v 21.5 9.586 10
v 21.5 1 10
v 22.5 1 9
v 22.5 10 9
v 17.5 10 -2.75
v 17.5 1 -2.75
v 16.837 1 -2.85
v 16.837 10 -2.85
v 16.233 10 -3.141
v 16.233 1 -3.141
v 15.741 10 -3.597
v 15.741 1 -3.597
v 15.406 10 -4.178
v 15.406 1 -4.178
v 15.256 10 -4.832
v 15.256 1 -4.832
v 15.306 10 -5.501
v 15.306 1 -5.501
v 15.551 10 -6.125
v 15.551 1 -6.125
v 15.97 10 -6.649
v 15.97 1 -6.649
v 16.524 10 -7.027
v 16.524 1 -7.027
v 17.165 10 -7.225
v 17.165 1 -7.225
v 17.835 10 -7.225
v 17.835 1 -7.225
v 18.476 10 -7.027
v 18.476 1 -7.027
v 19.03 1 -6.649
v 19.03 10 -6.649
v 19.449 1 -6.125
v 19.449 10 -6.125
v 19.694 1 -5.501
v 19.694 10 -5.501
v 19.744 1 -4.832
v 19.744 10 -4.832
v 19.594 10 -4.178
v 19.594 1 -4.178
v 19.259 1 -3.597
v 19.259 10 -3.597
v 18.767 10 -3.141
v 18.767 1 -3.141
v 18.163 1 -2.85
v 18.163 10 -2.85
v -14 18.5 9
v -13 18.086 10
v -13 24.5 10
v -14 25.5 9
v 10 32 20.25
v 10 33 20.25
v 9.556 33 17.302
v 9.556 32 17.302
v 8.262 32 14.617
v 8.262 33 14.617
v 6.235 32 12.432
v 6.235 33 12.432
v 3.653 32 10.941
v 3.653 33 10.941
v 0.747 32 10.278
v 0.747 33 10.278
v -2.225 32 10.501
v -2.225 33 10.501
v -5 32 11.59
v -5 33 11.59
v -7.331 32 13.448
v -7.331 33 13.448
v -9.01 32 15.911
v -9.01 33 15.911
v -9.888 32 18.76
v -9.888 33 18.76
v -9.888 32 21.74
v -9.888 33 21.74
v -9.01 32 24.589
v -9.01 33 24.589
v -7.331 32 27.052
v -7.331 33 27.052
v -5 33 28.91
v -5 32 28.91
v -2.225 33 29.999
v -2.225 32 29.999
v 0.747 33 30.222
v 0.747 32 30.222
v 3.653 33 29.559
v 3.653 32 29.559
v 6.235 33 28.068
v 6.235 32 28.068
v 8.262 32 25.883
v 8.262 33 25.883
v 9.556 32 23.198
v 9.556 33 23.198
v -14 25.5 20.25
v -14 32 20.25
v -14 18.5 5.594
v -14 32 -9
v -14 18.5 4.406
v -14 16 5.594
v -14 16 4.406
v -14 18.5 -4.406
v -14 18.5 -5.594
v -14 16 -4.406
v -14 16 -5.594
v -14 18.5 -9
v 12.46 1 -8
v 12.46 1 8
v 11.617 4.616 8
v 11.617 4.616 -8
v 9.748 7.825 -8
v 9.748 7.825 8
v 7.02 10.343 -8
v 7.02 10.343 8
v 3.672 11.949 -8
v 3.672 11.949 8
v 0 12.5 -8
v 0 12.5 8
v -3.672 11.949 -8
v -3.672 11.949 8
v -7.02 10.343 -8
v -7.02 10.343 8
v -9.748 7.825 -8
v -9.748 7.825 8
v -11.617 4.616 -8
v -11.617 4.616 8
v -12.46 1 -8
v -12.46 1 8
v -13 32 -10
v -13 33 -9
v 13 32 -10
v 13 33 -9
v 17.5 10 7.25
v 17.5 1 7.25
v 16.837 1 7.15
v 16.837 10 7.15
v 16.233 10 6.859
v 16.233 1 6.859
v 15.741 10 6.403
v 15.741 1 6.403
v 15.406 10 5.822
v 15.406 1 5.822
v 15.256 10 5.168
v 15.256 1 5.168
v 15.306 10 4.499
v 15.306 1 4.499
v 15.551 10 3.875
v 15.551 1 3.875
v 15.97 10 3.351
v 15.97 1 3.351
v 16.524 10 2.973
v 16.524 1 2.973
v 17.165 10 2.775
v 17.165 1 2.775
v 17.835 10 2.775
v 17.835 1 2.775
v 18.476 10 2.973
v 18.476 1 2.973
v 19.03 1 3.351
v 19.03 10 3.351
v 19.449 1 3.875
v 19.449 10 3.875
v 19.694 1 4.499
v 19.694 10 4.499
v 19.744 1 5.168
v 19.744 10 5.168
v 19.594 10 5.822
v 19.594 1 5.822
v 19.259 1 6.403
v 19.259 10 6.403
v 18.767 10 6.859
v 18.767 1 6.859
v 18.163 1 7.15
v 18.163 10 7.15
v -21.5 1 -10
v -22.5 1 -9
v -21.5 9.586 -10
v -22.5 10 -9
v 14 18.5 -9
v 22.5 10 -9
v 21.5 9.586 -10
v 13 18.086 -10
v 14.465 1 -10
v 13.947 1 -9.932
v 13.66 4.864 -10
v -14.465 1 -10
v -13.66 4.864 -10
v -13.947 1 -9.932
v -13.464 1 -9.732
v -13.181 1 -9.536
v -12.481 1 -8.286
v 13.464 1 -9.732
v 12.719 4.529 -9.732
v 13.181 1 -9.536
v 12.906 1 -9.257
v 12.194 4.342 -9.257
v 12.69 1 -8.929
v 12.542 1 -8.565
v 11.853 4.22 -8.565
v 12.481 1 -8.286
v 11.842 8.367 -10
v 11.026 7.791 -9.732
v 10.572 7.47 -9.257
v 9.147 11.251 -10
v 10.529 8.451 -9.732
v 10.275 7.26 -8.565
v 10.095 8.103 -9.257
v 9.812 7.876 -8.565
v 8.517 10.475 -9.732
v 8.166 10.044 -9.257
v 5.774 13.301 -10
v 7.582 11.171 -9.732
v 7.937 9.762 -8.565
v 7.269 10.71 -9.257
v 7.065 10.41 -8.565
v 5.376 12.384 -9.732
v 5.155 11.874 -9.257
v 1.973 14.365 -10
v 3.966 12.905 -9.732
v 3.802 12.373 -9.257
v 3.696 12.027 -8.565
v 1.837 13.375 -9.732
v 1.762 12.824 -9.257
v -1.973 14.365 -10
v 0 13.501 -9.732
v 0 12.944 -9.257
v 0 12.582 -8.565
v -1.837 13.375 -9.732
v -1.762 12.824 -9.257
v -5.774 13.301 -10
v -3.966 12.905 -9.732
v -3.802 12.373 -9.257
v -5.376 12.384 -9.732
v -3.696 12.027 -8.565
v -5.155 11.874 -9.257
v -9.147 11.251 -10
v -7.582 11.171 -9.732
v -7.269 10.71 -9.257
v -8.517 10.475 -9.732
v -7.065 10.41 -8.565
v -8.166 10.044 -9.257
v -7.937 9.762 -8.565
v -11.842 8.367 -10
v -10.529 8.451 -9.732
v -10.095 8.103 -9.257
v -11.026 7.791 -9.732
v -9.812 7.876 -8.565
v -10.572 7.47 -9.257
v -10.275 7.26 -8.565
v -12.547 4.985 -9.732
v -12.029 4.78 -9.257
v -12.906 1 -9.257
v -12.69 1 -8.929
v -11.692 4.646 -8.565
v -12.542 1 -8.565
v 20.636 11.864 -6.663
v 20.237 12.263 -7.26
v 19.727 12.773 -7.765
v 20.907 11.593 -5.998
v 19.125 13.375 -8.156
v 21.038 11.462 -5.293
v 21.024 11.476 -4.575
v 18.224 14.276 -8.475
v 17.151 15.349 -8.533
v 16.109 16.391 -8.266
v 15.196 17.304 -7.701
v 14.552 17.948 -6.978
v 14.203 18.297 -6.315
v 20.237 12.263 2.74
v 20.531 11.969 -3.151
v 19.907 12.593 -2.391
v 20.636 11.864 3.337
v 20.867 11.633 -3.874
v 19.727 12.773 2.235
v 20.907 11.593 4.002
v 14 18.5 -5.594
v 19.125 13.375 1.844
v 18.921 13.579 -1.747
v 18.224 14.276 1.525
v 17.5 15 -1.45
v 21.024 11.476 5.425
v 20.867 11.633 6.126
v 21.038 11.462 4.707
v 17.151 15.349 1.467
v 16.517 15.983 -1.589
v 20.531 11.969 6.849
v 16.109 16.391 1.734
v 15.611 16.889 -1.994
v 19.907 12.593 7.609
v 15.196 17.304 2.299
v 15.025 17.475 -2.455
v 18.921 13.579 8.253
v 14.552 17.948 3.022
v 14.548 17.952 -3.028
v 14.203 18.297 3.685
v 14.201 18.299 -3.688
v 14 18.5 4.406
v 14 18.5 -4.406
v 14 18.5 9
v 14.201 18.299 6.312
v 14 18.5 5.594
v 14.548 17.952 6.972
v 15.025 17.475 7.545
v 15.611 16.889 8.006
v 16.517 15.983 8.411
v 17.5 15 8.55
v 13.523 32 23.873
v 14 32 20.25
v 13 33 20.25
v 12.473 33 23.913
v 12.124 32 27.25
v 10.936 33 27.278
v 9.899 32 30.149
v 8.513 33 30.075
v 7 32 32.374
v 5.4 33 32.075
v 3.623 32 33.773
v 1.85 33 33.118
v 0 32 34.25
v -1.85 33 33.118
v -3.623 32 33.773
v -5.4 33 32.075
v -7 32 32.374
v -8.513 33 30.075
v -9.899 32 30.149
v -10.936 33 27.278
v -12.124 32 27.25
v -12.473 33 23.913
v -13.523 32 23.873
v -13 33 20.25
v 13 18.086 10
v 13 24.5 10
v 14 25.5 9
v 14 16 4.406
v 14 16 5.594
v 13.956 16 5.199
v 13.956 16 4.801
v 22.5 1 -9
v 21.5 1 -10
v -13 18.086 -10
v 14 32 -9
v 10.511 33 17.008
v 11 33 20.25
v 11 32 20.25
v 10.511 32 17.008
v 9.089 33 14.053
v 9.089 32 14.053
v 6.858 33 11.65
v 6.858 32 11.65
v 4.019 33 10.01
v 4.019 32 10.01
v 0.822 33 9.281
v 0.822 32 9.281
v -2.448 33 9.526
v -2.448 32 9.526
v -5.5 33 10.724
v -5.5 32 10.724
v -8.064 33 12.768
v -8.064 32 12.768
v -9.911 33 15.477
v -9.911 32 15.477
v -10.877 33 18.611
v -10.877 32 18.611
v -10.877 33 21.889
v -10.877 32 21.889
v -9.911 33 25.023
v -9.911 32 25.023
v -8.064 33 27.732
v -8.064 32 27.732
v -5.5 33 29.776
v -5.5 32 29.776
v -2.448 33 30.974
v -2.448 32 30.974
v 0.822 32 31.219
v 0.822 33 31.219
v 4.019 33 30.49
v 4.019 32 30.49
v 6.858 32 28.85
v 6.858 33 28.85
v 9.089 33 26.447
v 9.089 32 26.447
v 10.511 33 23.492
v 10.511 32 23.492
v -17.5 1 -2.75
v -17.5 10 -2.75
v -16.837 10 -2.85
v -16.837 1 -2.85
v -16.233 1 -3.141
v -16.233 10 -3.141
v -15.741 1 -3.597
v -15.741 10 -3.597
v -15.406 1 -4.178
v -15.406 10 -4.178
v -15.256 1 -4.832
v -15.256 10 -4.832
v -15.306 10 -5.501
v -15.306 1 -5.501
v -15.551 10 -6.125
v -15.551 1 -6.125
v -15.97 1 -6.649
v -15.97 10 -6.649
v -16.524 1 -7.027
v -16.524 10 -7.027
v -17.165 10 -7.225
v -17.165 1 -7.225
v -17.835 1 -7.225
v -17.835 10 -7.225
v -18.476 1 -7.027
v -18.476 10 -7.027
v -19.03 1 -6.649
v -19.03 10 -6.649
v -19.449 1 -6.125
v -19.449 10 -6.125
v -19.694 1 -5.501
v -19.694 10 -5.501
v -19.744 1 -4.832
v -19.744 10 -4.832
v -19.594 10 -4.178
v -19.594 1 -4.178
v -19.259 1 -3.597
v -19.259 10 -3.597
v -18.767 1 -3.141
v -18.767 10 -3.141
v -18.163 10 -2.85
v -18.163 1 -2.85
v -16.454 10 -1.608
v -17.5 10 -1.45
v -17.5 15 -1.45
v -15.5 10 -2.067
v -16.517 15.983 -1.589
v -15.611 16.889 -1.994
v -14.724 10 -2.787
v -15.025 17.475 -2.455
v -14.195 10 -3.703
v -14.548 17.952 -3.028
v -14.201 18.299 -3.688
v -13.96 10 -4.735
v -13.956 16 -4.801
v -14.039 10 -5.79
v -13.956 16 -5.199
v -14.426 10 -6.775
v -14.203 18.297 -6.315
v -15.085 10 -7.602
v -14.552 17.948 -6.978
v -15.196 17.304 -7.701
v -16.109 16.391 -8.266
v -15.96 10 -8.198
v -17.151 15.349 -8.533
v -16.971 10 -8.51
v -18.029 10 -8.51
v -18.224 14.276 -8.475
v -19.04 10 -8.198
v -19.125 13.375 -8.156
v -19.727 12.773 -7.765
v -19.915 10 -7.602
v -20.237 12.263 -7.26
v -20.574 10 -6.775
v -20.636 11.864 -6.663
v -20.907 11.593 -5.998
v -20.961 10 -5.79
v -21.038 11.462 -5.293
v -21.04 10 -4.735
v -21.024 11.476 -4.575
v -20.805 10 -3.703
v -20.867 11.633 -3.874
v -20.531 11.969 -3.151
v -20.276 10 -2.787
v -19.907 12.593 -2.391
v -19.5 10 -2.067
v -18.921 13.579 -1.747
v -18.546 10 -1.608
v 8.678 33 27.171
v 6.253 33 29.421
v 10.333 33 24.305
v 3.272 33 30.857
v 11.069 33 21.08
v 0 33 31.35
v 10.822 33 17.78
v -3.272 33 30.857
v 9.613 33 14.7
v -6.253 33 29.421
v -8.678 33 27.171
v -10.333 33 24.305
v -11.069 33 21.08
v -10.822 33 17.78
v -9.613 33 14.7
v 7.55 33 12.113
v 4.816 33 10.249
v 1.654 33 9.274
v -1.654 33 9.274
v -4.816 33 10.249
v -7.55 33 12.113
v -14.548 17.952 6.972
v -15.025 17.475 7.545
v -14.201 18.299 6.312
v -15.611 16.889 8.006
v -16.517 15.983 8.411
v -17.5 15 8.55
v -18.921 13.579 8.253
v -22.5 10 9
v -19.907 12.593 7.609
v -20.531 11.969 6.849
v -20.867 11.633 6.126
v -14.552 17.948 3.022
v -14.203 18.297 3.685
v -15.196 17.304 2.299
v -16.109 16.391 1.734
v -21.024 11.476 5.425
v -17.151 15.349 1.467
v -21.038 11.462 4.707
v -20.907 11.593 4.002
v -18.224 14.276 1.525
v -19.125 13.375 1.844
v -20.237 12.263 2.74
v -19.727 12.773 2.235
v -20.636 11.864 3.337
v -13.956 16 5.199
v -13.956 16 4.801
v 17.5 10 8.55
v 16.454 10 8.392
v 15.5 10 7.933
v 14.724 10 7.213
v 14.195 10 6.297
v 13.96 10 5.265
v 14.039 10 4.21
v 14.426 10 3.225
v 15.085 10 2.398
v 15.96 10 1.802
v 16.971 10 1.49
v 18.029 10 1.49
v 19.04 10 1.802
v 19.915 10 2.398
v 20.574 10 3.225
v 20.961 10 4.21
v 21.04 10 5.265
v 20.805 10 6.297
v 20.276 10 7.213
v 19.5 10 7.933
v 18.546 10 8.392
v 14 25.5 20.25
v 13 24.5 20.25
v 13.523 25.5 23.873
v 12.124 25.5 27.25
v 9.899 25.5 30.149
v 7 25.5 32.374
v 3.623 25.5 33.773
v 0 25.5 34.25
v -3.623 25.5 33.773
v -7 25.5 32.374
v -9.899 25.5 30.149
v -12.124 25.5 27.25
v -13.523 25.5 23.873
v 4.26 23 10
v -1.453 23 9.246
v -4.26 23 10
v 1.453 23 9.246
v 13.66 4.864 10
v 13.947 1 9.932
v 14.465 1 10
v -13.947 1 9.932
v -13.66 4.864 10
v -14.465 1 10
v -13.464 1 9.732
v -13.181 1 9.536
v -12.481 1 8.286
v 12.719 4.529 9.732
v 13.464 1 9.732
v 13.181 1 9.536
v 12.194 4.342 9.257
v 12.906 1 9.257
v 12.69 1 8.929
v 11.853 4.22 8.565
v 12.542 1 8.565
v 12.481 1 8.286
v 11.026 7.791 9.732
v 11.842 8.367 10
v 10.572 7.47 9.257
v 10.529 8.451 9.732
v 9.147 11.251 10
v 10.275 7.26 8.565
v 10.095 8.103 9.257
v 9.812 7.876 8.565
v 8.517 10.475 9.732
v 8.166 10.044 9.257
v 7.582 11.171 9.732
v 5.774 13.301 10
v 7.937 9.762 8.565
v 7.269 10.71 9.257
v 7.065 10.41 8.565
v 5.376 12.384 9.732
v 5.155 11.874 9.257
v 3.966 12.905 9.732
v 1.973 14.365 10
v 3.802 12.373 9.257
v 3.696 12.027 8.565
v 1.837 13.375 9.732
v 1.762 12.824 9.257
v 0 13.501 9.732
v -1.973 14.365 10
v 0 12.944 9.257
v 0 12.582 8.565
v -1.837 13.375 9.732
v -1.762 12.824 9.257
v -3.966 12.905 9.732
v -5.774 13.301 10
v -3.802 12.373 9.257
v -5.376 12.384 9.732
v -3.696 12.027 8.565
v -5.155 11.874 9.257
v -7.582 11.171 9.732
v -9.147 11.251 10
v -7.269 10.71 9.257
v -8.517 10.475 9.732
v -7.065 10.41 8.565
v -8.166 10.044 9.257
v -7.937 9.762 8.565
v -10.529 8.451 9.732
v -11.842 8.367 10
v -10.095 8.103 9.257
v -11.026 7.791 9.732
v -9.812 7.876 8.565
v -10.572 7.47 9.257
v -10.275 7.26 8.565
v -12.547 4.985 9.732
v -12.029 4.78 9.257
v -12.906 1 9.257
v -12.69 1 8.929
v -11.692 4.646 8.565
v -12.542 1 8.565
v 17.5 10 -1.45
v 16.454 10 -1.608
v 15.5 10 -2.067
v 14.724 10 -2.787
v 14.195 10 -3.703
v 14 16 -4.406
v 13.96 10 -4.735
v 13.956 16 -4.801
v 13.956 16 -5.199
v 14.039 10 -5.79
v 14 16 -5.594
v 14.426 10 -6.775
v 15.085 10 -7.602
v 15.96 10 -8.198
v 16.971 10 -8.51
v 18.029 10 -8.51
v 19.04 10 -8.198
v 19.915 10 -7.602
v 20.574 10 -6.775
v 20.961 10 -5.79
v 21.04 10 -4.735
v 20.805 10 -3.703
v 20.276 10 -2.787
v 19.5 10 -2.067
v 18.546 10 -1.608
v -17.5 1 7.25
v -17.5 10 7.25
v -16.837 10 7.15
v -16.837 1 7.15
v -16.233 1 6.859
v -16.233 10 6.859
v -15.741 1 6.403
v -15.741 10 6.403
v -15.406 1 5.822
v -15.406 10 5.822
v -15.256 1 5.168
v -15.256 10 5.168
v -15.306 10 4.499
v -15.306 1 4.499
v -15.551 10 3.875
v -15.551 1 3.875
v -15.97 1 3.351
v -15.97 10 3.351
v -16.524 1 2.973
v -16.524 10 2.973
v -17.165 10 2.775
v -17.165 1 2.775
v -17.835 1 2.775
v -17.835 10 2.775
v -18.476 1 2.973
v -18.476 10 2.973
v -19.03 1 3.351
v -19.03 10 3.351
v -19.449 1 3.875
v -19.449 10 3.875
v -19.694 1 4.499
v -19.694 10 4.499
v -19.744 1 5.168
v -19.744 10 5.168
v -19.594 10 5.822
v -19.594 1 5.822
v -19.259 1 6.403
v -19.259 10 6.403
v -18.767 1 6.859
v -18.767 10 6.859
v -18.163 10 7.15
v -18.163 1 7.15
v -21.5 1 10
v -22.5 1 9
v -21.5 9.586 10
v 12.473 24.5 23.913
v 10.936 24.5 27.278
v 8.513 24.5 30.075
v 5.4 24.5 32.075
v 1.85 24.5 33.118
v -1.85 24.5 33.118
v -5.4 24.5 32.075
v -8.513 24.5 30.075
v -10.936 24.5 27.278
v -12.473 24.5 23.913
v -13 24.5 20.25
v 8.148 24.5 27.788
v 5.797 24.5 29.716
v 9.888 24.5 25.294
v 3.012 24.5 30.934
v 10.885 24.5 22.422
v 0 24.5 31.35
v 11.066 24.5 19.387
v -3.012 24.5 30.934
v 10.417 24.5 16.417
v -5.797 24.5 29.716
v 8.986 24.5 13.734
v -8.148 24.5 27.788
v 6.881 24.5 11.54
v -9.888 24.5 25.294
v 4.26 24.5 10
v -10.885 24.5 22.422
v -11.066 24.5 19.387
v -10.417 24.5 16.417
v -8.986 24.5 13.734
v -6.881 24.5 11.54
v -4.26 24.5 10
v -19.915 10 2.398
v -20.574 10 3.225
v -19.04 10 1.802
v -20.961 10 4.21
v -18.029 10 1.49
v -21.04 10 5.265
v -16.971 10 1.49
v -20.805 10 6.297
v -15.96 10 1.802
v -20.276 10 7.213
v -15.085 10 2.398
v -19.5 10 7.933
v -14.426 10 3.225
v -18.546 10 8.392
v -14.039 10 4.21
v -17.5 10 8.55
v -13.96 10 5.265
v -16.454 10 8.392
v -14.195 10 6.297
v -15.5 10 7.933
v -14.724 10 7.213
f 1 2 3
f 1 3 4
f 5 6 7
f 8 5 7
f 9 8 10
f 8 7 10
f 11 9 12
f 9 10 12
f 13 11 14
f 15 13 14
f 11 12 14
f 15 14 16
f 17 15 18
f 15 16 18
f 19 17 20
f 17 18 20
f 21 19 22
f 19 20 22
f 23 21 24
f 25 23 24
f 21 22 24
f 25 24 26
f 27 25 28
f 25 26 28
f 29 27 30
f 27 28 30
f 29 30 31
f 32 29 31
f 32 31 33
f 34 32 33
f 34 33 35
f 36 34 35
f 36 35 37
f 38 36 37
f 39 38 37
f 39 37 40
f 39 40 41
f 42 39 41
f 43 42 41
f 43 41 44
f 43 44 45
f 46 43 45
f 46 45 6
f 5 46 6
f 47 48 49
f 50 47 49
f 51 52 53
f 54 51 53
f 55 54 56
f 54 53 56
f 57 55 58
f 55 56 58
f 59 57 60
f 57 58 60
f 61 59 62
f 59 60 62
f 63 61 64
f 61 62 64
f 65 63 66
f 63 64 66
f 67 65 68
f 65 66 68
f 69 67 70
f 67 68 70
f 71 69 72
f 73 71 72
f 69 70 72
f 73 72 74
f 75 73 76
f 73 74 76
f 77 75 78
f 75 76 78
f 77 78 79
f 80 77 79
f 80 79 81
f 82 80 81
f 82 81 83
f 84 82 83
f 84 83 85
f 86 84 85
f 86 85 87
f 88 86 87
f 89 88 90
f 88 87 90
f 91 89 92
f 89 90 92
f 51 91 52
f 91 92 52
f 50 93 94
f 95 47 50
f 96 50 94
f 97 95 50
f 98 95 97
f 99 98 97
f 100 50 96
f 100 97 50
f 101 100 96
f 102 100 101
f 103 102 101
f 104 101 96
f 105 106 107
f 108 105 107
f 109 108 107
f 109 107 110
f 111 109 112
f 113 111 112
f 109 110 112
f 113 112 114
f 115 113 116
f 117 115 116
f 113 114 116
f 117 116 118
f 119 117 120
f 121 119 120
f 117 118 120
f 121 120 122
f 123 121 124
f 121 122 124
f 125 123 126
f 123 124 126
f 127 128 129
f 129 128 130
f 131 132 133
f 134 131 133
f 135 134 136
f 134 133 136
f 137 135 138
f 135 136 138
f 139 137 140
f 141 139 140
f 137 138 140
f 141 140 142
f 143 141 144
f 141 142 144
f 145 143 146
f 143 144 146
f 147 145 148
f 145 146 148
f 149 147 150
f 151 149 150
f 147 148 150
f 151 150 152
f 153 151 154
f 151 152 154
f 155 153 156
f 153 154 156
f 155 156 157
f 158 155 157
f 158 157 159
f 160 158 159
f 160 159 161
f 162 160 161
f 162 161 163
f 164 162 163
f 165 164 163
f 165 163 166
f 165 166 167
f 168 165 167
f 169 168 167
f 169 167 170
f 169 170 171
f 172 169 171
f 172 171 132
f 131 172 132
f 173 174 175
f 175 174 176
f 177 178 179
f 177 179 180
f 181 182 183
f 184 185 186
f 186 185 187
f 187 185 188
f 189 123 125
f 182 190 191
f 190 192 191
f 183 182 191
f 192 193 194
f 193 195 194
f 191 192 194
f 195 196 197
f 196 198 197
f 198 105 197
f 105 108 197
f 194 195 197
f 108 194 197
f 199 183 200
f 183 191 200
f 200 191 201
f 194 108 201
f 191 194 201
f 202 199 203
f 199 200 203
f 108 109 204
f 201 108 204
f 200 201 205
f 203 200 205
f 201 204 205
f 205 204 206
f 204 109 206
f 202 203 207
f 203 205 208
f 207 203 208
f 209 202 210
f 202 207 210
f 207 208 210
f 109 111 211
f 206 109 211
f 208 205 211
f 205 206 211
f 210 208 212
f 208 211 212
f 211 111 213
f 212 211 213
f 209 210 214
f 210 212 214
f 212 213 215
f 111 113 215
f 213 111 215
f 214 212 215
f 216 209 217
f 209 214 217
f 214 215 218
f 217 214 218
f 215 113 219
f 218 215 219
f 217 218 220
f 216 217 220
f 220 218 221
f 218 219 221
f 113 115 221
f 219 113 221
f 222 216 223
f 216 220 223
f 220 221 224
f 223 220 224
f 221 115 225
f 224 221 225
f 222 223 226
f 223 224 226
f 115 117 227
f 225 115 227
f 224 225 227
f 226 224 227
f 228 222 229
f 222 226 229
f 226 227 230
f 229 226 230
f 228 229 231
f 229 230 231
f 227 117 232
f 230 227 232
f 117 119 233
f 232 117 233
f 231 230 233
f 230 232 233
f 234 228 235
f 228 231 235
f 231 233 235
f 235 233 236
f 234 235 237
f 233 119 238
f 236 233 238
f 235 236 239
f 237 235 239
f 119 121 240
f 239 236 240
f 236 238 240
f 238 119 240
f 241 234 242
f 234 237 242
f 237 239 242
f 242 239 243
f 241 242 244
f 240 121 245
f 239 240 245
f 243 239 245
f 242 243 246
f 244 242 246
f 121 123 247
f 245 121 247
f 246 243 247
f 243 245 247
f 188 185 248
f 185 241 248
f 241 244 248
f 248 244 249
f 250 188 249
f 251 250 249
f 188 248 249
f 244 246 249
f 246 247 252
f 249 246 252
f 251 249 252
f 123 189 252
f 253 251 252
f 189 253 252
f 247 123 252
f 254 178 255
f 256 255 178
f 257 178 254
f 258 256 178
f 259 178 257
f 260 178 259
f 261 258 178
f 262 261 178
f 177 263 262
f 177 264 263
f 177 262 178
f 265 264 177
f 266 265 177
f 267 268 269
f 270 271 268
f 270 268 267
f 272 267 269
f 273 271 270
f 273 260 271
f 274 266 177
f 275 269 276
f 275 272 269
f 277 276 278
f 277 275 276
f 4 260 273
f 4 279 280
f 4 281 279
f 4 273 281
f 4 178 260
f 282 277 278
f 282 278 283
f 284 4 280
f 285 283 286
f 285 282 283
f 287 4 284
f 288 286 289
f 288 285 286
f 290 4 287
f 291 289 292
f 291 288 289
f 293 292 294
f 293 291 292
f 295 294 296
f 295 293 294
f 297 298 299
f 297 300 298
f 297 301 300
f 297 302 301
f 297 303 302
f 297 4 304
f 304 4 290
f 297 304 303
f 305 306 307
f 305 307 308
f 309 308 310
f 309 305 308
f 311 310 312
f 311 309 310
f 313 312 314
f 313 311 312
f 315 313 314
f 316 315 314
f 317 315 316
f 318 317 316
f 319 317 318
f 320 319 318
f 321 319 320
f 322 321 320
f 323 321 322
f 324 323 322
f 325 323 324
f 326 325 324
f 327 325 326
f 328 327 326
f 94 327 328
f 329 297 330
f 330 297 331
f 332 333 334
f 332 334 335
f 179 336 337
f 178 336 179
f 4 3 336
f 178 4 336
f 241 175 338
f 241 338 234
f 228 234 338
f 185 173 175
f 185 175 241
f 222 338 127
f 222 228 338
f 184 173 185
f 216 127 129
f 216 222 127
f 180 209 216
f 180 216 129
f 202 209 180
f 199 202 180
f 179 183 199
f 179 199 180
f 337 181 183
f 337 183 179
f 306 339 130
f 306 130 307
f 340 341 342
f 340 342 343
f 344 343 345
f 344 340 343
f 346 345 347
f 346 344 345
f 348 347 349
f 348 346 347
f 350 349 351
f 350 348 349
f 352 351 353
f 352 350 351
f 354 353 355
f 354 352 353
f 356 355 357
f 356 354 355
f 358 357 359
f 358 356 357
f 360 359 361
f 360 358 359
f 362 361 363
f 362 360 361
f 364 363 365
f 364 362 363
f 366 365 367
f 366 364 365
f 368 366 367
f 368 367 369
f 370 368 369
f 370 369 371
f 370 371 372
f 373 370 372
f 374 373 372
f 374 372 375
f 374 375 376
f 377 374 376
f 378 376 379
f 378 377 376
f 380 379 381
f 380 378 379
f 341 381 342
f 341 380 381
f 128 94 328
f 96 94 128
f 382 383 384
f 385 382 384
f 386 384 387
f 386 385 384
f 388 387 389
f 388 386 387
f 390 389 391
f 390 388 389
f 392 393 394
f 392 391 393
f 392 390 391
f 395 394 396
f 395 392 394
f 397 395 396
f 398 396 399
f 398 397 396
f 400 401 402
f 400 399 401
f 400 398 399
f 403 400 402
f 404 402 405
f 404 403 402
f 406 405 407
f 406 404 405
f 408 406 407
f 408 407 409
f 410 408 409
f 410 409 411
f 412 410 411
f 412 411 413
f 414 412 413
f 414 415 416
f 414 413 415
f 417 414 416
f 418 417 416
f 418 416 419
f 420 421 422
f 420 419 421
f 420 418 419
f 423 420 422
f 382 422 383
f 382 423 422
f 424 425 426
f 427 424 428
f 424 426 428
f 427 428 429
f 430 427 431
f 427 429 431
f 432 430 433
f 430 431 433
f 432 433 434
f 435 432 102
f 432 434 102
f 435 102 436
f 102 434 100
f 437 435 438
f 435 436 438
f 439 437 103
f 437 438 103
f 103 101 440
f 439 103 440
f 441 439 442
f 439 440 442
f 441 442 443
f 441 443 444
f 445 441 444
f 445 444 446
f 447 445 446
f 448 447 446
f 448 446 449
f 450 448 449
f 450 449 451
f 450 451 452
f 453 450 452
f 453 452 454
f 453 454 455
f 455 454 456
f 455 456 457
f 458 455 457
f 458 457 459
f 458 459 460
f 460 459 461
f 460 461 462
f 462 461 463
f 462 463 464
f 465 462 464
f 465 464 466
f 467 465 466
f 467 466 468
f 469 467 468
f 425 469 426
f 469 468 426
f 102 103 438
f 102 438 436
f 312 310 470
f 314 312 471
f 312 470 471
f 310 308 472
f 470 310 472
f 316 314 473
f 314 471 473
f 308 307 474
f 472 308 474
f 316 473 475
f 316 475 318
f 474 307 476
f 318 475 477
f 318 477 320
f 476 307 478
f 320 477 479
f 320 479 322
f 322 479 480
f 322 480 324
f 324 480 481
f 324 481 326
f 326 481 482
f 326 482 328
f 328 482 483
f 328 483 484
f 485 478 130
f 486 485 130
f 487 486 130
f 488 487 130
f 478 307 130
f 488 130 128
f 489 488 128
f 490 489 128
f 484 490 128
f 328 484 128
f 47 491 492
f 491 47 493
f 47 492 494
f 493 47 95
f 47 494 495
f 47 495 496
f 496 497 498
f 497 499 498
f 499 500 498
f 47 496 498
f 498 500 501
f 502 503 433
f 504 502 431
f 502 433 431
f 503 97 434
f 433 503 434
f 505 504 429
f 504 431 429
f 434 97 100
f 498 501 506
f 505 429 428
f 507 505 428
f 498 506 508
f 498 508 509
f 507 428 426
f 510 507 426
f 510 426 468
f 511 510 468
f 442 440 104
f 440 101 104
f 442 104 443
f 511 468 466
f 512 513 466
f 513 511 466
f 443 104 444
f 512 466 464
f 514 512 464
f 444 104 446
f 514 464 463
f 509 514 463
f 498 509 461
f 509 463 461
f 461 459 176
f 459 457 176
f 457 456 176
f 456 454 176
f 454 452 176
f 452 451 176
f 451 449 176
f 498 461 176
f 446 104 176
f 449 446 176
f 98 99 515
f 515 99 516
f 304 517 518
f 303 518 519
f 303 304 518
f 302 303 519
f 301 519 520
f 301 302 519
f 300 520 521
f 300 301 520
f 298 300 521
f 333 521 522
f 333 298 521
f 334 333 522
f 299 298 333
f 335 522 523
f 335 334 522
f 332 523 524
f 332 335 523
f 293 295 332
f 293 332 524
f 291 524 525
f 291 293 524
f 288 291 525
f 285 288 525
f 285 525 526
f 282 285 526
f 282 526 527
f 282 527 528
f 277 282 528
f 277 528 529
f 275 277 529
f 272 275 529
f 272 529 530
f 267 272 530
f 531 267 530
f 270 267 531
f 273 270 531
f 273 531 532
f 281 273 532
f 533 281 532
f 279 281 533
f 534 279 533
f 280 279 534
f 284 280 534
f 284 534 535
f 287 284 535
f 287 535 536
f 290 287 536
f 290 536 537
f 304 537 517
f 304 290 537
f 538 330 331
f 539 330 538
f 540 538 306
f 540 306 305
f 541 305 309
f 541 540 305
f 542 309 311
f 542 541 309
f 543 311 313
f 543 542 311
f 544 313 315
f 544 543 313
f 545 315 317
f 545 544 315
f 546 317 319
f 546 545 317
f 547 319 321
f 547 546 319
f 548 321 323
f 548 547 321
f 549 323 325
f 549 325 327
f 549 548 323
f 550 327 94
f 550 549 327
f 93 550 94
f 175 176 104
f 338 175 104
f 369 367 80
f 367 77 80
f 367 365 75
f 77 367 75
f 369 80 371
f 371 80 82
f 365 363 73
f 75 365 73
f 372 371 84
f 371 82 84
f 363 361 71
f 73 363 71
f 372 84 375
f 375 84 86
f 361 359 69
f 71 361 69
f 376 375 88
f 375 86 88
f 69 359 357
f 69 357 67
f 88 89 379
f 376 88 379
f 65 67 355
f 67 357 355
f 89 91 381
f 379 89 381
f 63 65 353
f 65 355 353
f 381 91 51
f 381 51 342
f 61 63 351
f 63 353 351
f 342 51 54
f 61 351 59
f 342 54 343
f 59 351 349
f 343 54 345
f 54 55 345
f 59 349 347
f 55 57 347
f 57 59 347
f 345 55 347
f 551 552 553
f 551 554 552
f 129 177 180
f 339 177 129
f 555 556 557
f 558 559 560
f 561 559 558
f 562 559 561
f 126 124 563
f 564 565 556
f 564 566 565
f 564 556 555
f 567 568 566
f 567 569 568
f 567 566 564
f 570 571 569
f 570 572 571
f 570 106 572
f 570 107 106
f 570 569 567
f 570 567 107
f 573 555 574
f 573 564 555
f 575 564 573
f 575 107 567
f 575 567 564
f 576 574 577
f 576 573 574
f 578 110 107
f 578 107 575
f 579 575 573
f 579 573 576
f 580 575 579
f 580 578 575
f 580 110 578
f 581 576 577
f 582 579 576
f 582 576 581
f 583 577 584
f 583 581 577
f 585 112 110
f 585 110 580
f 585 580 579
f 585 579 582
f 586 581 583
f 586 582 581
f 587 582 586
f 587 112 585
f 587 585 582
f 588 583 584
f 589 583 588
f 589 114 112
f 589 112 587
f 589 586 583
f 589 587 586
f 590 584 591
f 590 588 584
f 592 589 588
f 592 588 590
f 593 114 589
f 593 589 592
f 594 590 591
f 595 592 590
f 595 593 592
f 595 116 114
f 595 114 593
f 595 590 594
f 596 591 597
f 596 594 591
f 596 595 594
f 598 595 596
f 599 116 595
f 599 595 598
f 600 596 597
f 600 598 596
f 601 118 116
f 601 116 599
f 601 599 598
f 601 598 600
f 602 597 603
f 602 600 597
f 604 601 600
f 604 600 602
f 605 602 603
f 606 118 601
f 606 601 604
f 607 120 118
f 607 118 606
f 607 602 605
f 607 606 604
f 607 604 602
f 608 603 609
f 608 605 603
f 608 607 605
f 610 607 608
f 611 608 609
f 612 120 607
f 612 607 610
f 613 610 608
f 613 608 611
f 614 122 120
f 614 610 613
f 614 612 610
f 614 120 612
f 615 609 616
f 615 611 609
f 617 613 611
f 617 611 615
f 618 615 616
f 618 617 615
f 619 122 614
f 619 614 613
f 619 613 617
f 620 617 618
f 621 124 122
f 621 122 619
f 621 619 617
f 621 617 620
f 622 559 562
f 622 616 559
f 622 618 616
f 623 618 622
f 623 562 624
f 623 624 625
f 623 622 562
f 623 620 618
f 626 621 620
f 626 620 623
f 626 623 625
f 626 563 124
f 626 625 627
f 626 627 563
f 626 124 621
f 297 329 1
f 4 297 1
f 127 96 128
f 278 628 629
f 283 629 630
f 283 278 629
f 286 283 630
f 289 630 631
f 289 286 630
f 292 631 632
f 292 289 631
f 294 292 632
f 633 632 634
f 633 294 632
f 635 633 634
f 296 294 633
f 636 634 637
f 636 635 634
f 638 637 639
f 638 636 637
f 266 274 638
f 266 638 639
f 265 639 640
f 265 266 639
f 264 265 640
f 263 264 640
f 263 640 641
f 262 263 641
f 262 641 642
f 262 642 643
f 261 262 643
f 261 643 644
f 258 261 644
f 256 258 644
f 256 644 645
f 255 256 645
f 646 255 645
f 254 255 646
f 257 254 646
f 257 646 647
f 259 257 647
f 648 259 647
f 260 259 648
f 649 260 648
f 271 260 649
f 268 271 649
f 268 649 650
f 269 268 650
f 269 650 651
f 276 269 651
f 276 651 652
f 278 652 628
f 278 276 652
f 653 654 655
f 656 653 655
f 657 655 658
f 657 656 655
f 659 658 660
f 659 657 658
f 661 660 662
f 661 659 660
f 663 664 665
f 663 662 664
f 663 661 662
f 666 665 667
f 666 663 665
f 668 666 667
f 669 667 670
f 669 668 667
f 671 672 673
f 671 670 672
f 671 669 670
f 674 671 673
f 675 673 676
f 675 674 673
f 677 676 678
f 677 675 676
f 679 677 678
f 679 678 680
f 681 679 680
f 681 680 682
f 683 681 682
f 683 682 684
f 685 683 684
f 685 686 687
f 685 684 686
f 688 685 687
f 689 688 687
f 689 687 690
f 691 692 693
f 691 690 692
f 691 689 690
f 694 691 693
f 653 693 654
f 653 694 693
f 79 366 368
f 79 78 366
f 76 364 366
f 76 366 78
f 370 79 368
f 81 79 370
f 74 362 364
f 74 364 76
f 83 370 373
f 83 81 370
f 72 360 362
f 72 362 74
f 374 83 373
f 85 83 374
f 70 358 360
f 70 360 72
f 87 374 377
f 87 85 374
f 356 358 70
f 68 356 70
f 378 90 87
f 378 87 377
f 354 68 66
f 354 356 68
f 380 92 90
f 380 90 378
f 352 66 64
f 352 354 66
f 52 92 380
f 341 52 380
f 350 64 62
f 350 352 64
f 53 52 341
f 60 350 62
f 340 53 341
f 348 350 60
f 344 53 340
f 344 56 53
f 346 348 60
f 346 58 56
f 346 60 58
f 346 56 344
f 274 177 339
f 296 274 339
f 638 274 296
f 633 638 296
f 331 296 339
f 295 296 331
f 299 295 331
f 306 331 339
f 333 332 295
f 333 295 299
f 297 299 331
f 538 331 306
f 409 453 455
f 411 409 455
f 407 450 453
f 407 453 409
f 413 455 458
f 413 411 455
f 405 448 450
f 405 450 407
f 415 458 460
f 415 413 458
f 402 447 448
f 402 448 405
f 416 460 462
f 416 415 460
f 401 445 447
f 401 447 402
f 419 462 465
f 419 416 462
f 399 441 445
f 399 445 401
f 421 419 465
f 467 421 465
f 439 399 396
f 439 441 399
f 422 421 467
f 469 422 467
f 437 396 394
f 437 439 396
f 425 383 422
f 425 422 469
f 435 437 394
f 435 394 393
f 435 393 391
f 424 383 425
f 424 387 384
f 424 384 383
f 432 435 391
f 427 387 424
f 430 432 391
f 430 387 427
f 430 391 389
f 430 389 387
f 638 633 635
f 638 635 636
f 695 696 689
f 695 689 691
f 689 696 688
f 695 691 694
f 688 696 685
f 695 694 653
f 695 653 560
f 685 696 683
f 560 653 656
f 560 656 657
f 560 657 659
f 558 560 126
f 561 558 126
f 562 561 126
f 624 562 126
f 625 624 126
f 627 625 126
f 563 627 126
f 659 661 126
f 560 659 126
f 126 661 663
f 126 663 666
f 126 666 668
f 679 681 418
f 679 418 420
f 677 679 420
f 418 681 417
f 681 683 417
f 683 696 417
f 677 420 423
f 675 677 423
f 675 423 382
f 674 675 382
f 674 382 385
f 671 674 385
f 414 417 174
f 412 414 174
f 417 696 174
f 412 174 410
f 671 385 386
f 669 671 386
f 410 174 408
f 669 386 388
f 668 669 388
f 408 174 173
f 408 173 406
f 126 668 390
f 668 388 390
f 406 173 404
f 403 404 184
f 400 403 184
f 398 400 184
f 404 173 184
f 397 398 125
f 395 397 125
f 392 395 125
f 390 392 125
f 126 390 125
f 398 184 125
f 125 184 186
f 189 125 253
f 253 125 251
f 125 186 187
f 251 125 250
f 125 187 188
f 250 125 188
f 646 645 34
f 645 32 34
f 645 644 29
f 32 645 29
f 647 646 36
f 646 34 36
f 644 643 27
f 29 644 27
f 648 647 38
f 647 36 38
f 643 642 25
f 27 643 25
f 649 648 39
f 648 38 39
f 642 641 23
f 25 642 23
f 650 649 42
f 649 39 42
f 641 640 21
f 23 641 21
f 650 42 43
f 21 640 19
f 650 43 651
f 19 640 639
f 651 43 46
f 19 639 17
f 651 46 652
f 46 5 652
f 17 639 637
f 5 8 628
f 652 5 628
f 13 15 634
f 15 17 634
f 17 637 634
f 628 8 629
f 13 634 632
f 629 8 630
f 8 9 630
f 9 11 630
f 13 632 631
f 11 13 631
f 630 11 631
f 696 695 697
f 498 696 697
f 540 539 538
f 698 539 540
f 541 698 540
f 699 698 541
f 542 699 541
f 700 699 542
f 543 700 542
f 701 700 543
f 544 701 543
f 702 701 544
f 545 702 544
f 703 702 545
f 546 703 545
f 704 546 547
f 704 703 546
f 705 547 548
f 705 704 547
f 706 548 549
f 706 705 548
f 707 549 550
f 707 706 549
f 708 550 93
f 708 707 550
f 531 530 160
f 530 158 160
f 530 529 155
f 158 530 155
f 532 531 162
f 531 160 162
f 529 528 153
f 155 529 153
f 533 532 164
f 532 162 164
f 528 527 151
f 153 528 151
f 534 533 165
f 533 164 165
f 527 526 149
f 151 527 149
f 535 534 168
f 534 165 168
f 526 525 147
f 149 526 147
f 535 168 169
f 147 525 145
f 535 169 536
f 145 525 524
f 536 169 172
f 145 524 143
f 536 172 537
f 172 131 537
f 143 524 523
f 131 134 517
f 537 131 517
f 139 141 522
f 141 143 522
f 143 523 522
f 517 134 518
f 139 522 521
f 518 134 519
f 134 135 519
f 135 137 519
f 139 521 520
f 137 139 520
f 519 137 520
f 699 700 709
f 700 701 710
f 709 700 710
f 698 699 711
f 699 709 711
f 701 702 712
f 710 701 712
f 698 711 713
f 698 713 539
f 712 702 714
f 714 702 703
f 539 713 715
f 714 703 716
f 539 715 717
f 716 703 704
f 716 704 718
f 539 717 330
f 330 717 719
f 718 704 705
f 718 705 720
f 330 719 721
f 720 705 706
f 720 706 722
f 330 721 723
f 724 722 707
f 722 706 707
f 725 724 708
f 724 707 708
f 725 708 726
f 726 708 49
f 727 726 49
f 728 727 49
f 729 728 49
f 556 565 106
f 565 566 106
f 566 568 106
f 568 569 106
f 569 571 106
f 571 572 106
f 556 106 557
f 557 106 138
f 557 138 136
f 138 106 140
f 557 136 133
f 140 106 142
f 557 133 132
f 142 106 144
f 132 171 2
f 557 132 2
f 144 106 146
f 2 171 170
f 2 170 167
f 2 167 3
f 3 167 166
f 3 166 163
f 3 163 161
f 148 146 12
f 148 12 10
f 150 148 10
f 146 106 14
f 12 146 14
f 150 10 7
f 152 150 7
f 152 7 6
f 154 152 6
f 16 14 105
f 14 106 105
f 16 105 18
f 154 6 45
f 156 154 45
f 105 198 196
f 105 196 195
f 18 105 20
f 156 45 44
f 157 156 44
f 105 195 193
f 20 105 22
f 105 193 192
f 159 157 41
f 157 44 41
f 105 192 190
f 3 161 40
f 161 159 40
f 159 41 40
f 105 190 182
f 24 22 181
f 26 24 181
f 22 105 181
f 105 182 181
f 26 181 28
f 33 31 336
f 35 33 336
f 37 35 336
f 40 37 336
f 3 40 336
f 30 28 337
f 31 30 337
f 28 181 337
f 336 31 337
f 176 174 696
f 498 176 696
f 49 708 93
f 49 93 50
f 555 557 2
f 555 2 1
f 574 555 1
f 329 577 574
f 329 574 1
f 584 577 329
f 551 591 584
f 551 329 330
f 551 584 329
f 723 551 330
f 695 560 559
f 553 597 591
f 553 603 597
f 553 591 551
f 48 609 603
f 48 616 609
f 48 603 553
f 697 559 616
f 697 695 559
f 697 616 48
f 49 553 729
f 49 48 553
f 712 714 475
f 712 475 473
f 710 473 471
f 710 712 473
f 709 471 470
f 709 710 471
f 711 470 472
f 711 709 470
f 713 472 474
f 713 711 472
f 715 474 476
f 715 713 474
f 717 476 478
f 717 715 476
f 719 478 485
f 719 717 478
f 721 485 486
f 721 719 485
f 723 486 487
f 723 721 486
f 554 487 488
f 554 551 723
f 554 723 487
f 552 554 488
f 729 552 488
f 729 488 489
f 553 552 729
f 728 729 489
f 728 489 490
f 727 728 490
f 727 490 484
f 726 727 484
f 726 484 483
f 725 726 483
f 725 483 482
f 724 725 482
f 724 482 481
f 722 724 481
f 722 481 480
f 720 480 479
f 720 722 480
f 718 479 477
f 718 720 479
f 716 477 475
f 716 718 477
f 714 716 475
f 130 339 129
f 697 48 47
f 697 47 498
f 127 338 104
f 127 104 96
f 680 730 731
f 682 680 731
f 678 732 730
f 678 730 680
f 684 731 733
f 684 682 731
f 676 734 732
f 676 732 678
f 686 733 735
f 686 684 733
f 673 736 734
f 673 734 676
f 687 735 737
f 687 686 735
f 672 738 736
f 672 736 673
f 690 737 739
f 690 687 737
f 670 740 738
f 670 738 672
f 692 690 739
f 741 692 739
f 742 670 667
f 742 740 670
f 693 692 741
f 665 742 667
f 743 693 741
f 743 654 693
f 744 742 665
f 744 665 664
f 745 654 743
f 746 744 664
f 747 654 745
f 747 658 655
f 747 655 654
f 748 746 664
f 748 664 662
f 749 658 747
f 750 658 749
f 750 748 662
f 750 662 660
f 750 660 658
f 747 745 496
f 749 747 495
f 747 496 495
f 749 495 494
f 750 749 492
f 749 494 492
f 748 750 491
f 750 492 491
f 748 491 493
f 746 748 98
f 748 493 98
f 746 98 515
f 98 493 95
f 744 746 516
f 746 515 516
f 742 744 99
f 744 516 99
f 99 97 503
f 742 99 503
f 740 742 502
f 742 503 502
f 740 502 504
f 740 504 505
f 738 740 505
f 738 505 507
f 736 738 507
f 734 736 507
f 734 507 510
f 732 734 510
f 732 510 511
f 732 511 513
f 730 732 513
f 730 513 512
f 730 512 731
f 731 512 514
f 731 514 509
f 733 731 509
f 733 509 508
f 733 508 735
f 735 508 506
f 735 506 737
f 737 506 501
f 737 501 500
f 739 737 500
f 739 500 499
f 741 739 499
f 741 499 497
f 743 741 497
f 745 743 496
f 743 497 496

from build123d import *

# Parameters (mm, degrees)
BOSS_EXTRUDE1_DEPTH      = 23
CUT_EXTRUDE1_REACH       = 39.885
CUT_EXTRUDE2_REACH       = 35.693
SKETCH3_R                = 2.25
CUT_EXTRUDE3_START       = 23
SKETCH4_R                = 3.55
CUT_EXTRUDE3_DEPTH       = 13
FILLET1_R                = 2
CHAMFER1_SIZE            = 13
BOSS_EXTRUDE2_DEPTH      = 10
BOSS_EXTRUDE2_DEPTH_BACK = 7
SKETCH6_R                = 11.1
CUT_EXTRUDE4_START       = -128
SKETCH7_W                = 24.25
SKETCH7_H                = 8.5
CUT_EXTRUDE4_DEPTH       = 28
EXTRUDE_THIN1_START      = -10
SKETCH8_R                = 11
SKETCH8_R_2              = 10
EXTRUDE_THIN1_DEPTH      = 1
CHAMFER2_SIZE            = 1
CUT_EXTRUDE5_DEPTH       = 10
CUT_EXTRUDE5_DEPTH_BACK  = 10
SKETCH9_W                = 45
SKETCH9_H                = 1


with BuildPart() as part:
    # Sketch1 → Boss-Extrude1 (new body)
    with BuildSketch(Plane(origin=(0, 0, 0), x_dir=(1, 0, 0), z_dir=(0, 1, 0))):
        Polygon((0, 10), (-22.5, 10), (-22.5, -10), (22.5, -10), (22.5, 10), align=None)
    extrude(amount=BOSS_EXTRUDE1_DEPTH)

    # Sketch2 → Cut-Extrude1 (cut, up to next)
    with BuildSketch(Plane.XY.offset(10), mode=Mode.PRIVATE) as cut_extrude1_sk1:
        with BuildLine():
            Line((-12.5, 0), (-22.5, 0))
            Line((-22.5, 0), (-22.5, -2.522641864))
            Line((-22.5, -2.522641864), (22.5, -2.522641864))
            Line((22.5, -2.522641864), (22.5, 0))
            Line((22.5, 0), (12.5, 0))
            ThreePointArc((12.5, 0), (0, 12.5), (-12.5, 0))
        make_face()
    cut_extrude1_tool1 = extrude(cut_extrude1_sk1.sketch, amount=-CUT_EXTRUDE1_REACH, mode=Mode.PRIVATE) & part.part
    add(cut_extrude1_tool1.solids().sort_by_distance((0, 3.22853, 10))[0], mode=Mode.SUBTRACT)

    # Sketch3 → Cut-Extrude2 (cut, up to next)
    with BuildSketch(Plane(origin=(0, 0, 0), x_dir=(1, 0, 0), z_dir=(0, 1, 0)), mode=Mode.PRIVATE) as cut_extrude2_sk1:
        with Locations(Location((-17.5, -5, 0), (0, 0, 270))):
            Circle(SKETCH3_R)
    cut_extrude2_tool1 = extrude(cut_extrude2_sk1.sketch, amount=CUT_EXTRUDE2_REACH, mode=Mode.PRIVATE) & part.part
    # Sketch3 → Cut-Extrude2 (cut, up to next)
    with BuildSketch(Plane(origin=(0, 0, 0), x_dir=(1, 0, 0), z_dir=(0, 1, 0)), mode=Mode.PRIVATE) as cut_extrude2_sk2:
        with Locations(Location((-17.5, 5, 0), (0, 0, 270))):
            Circle(SKETCH3_R)
    cut_extrude2_tool2 = extrude(cut_extrude2_sk2.sketch, amount=CUT_EXTRUDE2_REACH, mode=Mode.PRIVATE) & part.part
    cut_extrude2_1 = cut_extrude2_tool1.solids().sort_by_distance((-17.5, 0, 5))[0]
    add(cut_extrude2_1, mode=Mode.SUBTRACT)
    cut_extrude2_2 = cut_extrude2_tool2.solids().sort_by_distance((-17.5, 0, -5))[0]
    add(cut_extrude2_2, mode=Mode.SUBTRACT)
    cut_extrude2 = cut_extrude2_1 + cut_extrude2_2  # Cut-Extrude2 as one shape, for the pattern or mirror that repeats it

    # Mirror1: Cut-Extrude2 across plane
    add(cut_extrude2.mirror(Plane(origin=(0, 0, 0), x_dir=(0, 0, 1), z_dir=(1, 0, 0))), mode=Mode.SUBTRACT)

    # Sketch4 → Cut-Extrude3 (cut)
    with BuildSketch(Plane(origin=(0, 0, 0), x_dir=(1, 0, 0), z_dir=(0, 1, 0)).offset(CUT_EXTRUDE3_START)):
        with Locations(Location((-17.5, 5, 0), (0, 0, 270))):
            Circle(SKETCH4_R)
        with Locations(Location((-17.5, -5, 0), (0, 0, 270))):
            Circle(SKETCH4_R)
    cut_extrude3 = extrude(amount=-CUT_EXTRUDE3_DEPTH, mode=Mode.SUBTRACT)

    # Mirror2: Cut-Extrude3 across plane
    add(cut_extrude3.mirror(Plane(origin=(0, 0, 0), x_dir=(0, 0, 1), z_dir=(1, 0, 0))), mode=Mode.SUBTRACT)

    # Fillet1
    fillet1_edges = [part.edges().sort_by_distance(p)[0] for p in [
        (0, 12.5, 10),
        (0, 12.5, -10),
    ]]
    fillet(fillet1_edges, radius=FILLET1_R)

    # Chamfer1
    # the kernel refuses this chamfer: 13 mm, written as the material it takes off along each edge
    with BuildSketch(Plane(origin=(-22.5, 23, -43.431878844), x_dir=(0.9996219169112968, 0.027495876610586424, 0), z_dir=(0, 0, 1))) as chamfer1_piece_1:
        Polygon((CHAMFER1_SIZE * 0.999621916911, -CHAMFER1_SIZE * 0.0274958766106), (-CHAMFER1_SIZE * 0.0274958766106, -CHAMFER1_SIZE * 0.999621916911), (0, 0), align=None)
    extrude(amount=86.863757687, mode=Mode.SUBTRACT)
    with BuildSketch(Plane(origin=(22.5, 23, 43.431878844), x_dir=(0.027495876610586424, -0.9996219169112968, 0), z_dir=(0, 0, -1))) as chamfer1_piece_2:
        Polygon((CHAMFER1_SIZE * 0.999621916911, CHAMFER1_SIZE * 0.0274958766106), (-CHAMFER1_SIZE * 0.0274958766106, CHAMFER1_SIZE * 0.999621916911), (0, 0), align=None)
    extrude(amount=86.863757687, mode=Mode.SUBTRACT)

    # Sketch6 → Boss-Extrude2 (add, two sides: drawn at the far end of the back side and taken through both)
    with BuildSketch(Plane(origin=(0, 23, 0), x_dir=(1, 0, 0), z_dir=(0, 1, 0)).offset(-BOSS_EXTRUDE2_DEPTH_BACK)):
        with BuildLine():
            ThreePointArc((14, -20.25), (0, -34.25), (-14, -20.25))
            Line((-14, -20.25), (-14, -10))
            Line((-14, -10), (-14, 10))
            Line((-14, 10), (14, 10))
            Line((14, 10), (14, -10))
            Line((14, -10), (14, -20.25))
        make_face()
        with Locations(Location((0, -20.25, 0), (0, 0, 270))):
            Circle(SKETCH6_R, mode=Mode.SUBTRACT)
    extrude(amount=BOSS_EXTRUDE2_DEPTH + BOSS_EXTRUDE2_DEPTH_BACK)

    # Sketch7 → Cut-Extrude4 (cut)
    with BuildSketch(Plane(origin=(114, 0, 0), x_dir=(0, 0, -1), z_dir=(1, 0, 0)).offset(CUT_EXTRUDE4_START)):
        with Locations((-22.125, 20.25)):
            Rectangle(SKETCH7_W, SKETCH7_H)
    extrude(amount=CUT_EXTRUDE4_DEPTH, mode=Mode.SUBTRACT)

    # Chamfer2
    chamfer2_edges = [part.edges().sort_by_distance(p)[0] for p in [
        (14, 25.75, -10),
        (14, 33, 5.125),
        (-14, 33, 5.125),
        (0, 33, 34.25),
        (-14, 25.75, -10),
        (0, 33, -10),
        (-14, 24.5, 15.125),
        (0, 24.5, 34.25),
        (14, 24.5, 15.125),
        (14, 21.5, 10),
        (-14, 21.5, 10),
        (-22.5, 5, -10),
        (22.5, 5, -10),
        (-18.25, 14.25, -10),
        (22.5, 5, 10),
        (-22.5, 5, 10),
        (18.25, 14.25, 10),
        (-18.25, 14.25, 10),
        (18.25, 14.25, -10),
    ]]
    chamfer(chamfer2_edges, length=CHAMFER2_SIZE)

    # Sketch9 → Cut-Extrude5 (cut, two sides: drawn at the far end of the back side and taken through both)
    with BuildSketch(Plane.XY.offset(-CUT_EXTRUDE5_DEPTH_BACK)):
        with Locations((0, 0.5)):
            Rectangle(SKETCH9_W, SKETCH9_H)
    extrude(amount=CUT_EXTRUDE5_DEPTH + CUT_EXTRUDE5_DEPTH_BACK, mode=Mode.SUBTRACT)


with BuildPart() as body_2:
    # Sketch8 → Extrude-Thin1 (new body)
    with BuildSketch(Plane(origin=(0, 43, 0), x_dir=(1, 0, 0), z_dir=(0, 1, 0)).offset(EXTRUDE_THIN1_START)):
        with Locations((0, -20.25)):
            Circle(SKETCH8_R)
        with Locations((0, -20.25)):
            Circle(SKETCH8_R_2, mode=Mode.SUBTRACT)
    extrude(amount=-EXTRUDE_THIN1_DEPTH)


solid = Compound([part.part, body_2.part])
